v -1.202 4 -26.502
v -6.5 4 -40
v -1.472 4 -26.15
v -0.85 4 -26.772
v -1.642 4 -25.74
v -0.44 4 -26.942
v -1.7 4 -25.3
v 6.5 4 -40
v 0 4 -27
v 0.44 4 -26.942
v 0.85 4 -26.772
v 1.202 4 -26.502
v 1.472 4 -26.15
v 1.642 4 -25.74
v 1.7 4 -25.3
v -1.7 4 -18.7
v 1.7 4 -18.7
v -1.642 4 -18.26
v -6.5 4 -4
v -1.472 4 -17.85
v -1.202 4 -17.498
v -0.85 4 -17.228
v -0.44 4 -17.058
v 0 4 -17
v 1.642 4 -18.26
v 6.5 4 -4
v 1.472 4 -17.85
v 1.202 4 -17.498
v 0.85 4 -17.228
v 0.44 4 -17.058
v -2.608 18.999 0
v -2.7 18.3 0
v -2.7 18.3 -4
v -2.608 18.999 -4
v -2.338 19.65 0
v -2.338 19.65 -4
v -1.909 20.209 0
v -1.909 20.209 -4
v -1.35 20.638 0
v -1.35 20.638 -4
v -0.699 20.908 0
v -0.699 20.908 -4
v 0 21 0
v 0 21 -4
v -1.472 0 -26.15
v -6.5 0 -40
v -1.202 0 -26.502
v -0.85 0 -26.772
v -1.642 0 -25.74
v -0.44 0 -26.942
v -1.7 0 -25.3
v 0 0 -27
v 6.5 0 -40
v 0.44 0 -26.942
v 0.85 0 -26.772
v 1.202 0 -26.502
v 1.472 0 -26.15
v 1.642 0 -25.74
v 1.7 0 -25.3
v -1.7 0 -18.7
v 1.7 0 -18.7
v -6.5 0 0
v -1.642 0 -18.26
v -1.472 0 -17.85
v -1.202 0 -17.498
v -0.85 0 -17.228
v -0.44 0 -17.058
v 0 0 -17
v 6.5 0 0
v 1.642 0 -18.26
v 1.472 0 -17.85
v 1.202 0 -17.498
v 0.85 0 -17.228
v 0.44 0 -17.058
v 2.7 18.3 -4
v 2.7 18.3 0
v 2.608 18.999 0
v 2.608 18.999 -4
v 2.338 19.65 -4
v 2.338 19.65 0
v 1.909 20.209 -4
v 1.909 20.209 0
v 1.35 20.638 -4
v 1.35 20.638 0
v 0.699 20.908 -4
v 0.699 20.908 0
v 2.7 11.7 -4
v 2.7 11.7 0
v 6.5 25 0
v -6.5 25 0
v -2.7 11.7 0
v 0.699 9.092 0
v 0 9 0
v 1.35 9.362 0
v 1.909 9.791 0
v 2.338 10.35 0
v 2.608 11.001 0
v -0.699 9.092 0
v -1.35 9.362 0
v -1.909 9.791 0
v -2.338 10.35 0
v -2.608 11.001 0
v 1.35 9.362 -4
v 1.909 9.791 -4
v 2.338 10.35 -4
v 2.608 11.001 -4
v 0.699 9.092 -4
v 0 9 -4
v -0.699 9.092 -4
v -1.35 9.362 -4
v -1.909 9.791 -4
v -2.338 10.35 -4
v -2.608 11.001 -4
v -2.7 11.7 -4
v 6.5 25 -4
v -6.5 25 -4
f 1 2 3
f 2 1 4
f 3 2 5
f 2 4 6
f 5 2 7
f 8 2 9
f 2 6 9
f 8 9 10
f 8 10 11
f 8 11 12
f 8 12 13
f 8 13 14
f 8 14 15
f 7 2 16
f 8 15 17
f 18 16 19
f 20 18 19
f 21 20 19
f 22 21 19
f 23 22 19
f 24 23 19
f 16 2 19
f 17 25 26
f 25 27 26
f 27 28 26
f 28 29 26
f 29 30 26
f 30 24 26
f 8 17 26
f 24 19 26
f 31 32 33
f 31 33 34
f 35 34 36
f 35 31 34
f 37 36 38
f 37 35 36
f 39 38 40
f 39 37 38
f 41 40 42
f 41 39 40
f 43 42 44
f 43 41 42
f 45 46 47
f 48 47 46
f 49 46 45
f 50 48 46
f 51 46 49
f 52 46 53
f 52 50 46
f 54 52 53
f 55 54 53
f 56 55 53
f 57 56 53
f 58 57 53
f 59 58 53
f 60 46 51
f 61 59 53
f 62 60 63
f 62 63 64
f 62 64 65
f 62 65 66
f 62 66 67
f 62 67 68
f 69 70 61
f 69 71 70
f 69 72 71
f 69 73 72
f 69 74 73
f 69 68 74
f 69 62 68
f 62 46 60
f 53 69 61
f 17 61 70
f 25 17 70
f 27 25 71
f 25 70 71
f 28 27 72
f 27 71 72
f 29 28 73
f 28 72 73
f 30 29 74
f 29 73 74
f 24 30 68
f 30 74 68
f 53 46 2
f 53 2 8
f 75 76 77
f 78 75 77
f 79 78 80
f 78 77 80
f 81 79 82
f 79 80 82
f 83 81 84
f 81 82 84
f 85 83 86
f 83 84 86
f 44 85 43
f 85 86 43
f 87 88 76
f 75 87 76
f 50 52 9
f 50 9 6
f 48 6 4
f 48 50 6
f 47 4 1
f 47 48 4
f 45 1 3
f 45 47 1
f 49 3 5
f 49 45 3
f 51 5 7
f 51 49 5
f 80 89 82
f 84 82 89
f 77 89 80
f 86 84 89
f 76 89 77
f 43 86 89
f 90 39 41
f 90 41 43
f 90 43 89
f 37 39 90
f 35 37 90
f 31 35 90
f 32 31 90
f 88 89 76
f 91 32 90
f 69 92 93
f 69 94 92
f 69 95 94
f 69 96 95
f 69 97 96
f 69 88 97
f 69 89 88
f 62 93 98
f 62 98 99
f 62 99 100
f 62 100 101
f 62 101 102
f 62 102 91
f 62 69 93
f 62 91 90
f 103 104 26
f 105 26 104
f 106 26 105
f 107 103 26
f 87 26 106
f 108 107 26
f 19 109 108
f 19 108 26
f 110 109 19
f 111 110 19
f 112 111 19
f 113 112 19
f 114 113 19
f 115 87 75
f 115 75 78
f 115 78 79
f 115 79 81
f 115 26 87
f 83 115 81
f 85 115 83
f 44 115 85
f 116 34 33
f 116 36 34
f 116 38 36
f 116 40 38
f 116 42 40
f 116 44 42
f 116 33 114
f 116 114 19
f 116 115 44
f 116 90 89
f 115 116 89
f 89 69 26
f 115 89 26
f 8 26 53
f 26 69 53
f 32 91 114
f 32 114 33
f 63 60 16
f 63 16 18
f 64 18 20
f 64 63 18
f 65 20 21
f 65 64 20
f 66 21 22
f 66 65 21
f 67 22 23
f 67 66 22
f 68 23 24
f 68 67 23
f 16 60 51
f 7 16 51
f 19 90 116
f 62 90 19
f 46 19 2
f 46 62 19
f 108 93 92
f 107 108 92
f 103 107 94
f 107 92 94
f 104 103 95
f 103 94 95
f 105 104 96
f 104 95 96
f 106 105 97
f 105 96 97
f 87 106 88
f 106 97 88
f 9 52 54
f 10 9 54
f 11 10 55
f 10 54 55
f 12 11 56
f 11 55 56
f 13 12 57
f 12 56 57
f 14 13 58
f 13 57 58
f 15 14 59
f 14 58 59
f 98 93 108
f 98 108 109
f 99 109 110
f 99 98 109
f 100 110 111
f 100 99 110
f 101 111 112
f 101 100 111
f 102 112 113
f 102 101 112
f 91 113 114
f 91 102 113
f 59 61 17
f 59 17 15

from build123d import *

# Parameters (mm, degrees)
PAD_DEPTH    = 4
PAD001_DEPTH = 4


with BuildPart() as part:
    # Sketch → Pad (new body)
    with BuildSketch(Plane.XZ):
        with BuildLine():
            Line((0, 0), (6.5, 0))
            Line((6.5, 0), (6.5, -40))
            Line((6.5, -40), (0, -40))
            Line((0, -40), (0, -27))
            ThreePointArc((0, -27), (1.202076, -26.502087), (1.7, -25.300015))
            Line((1.7, -18.700016), (1.7, -25.300015))
            ThreePointArc((1.7, -18.700016), (1.202087, -17.497924), (0, -17))
            Line((0, -17), (0, 0))
        make_face()
    pad = extrude(amount=-PAD_DEPTH)

    # Sketch001 → Pad001 (join)
    with BuildSketch(Plane.XY):
        with BuildLine():
            Line((0, 0), (6.5, 0))
            Line((6.5, 0), (6.5, 25))
            Line((6.5, 25), (0, 25))
            Line((0, 25), (0, 21))
            ThreePointArc((2.7, 18.3), (1.909188, 20.209188), (0, 21))
            Line((2.7, 11.7), (2.7, 18.3))
            ThreePointArc((0, 9), (1.909188, 9.790812), (2.7, 11.7))
            Line((0, 9), (0, 0))
        make_face()
    pad001 = extrude(amount=-PAD001_DEPTH)

    # Mirrored: Pad, Pad001 across Sketch V_Axis
    add(pad.mirror(Plane(origin=(0, 0, 0), x_dir=(0, -1, 0), z_dir=(1, 0, 0))))
    add(pad001.mirror(Plane(origin=(0, 0, 0), x_dir=(0, -1, 0), z_dir=(1, 0, 0))))


solid = part.part
